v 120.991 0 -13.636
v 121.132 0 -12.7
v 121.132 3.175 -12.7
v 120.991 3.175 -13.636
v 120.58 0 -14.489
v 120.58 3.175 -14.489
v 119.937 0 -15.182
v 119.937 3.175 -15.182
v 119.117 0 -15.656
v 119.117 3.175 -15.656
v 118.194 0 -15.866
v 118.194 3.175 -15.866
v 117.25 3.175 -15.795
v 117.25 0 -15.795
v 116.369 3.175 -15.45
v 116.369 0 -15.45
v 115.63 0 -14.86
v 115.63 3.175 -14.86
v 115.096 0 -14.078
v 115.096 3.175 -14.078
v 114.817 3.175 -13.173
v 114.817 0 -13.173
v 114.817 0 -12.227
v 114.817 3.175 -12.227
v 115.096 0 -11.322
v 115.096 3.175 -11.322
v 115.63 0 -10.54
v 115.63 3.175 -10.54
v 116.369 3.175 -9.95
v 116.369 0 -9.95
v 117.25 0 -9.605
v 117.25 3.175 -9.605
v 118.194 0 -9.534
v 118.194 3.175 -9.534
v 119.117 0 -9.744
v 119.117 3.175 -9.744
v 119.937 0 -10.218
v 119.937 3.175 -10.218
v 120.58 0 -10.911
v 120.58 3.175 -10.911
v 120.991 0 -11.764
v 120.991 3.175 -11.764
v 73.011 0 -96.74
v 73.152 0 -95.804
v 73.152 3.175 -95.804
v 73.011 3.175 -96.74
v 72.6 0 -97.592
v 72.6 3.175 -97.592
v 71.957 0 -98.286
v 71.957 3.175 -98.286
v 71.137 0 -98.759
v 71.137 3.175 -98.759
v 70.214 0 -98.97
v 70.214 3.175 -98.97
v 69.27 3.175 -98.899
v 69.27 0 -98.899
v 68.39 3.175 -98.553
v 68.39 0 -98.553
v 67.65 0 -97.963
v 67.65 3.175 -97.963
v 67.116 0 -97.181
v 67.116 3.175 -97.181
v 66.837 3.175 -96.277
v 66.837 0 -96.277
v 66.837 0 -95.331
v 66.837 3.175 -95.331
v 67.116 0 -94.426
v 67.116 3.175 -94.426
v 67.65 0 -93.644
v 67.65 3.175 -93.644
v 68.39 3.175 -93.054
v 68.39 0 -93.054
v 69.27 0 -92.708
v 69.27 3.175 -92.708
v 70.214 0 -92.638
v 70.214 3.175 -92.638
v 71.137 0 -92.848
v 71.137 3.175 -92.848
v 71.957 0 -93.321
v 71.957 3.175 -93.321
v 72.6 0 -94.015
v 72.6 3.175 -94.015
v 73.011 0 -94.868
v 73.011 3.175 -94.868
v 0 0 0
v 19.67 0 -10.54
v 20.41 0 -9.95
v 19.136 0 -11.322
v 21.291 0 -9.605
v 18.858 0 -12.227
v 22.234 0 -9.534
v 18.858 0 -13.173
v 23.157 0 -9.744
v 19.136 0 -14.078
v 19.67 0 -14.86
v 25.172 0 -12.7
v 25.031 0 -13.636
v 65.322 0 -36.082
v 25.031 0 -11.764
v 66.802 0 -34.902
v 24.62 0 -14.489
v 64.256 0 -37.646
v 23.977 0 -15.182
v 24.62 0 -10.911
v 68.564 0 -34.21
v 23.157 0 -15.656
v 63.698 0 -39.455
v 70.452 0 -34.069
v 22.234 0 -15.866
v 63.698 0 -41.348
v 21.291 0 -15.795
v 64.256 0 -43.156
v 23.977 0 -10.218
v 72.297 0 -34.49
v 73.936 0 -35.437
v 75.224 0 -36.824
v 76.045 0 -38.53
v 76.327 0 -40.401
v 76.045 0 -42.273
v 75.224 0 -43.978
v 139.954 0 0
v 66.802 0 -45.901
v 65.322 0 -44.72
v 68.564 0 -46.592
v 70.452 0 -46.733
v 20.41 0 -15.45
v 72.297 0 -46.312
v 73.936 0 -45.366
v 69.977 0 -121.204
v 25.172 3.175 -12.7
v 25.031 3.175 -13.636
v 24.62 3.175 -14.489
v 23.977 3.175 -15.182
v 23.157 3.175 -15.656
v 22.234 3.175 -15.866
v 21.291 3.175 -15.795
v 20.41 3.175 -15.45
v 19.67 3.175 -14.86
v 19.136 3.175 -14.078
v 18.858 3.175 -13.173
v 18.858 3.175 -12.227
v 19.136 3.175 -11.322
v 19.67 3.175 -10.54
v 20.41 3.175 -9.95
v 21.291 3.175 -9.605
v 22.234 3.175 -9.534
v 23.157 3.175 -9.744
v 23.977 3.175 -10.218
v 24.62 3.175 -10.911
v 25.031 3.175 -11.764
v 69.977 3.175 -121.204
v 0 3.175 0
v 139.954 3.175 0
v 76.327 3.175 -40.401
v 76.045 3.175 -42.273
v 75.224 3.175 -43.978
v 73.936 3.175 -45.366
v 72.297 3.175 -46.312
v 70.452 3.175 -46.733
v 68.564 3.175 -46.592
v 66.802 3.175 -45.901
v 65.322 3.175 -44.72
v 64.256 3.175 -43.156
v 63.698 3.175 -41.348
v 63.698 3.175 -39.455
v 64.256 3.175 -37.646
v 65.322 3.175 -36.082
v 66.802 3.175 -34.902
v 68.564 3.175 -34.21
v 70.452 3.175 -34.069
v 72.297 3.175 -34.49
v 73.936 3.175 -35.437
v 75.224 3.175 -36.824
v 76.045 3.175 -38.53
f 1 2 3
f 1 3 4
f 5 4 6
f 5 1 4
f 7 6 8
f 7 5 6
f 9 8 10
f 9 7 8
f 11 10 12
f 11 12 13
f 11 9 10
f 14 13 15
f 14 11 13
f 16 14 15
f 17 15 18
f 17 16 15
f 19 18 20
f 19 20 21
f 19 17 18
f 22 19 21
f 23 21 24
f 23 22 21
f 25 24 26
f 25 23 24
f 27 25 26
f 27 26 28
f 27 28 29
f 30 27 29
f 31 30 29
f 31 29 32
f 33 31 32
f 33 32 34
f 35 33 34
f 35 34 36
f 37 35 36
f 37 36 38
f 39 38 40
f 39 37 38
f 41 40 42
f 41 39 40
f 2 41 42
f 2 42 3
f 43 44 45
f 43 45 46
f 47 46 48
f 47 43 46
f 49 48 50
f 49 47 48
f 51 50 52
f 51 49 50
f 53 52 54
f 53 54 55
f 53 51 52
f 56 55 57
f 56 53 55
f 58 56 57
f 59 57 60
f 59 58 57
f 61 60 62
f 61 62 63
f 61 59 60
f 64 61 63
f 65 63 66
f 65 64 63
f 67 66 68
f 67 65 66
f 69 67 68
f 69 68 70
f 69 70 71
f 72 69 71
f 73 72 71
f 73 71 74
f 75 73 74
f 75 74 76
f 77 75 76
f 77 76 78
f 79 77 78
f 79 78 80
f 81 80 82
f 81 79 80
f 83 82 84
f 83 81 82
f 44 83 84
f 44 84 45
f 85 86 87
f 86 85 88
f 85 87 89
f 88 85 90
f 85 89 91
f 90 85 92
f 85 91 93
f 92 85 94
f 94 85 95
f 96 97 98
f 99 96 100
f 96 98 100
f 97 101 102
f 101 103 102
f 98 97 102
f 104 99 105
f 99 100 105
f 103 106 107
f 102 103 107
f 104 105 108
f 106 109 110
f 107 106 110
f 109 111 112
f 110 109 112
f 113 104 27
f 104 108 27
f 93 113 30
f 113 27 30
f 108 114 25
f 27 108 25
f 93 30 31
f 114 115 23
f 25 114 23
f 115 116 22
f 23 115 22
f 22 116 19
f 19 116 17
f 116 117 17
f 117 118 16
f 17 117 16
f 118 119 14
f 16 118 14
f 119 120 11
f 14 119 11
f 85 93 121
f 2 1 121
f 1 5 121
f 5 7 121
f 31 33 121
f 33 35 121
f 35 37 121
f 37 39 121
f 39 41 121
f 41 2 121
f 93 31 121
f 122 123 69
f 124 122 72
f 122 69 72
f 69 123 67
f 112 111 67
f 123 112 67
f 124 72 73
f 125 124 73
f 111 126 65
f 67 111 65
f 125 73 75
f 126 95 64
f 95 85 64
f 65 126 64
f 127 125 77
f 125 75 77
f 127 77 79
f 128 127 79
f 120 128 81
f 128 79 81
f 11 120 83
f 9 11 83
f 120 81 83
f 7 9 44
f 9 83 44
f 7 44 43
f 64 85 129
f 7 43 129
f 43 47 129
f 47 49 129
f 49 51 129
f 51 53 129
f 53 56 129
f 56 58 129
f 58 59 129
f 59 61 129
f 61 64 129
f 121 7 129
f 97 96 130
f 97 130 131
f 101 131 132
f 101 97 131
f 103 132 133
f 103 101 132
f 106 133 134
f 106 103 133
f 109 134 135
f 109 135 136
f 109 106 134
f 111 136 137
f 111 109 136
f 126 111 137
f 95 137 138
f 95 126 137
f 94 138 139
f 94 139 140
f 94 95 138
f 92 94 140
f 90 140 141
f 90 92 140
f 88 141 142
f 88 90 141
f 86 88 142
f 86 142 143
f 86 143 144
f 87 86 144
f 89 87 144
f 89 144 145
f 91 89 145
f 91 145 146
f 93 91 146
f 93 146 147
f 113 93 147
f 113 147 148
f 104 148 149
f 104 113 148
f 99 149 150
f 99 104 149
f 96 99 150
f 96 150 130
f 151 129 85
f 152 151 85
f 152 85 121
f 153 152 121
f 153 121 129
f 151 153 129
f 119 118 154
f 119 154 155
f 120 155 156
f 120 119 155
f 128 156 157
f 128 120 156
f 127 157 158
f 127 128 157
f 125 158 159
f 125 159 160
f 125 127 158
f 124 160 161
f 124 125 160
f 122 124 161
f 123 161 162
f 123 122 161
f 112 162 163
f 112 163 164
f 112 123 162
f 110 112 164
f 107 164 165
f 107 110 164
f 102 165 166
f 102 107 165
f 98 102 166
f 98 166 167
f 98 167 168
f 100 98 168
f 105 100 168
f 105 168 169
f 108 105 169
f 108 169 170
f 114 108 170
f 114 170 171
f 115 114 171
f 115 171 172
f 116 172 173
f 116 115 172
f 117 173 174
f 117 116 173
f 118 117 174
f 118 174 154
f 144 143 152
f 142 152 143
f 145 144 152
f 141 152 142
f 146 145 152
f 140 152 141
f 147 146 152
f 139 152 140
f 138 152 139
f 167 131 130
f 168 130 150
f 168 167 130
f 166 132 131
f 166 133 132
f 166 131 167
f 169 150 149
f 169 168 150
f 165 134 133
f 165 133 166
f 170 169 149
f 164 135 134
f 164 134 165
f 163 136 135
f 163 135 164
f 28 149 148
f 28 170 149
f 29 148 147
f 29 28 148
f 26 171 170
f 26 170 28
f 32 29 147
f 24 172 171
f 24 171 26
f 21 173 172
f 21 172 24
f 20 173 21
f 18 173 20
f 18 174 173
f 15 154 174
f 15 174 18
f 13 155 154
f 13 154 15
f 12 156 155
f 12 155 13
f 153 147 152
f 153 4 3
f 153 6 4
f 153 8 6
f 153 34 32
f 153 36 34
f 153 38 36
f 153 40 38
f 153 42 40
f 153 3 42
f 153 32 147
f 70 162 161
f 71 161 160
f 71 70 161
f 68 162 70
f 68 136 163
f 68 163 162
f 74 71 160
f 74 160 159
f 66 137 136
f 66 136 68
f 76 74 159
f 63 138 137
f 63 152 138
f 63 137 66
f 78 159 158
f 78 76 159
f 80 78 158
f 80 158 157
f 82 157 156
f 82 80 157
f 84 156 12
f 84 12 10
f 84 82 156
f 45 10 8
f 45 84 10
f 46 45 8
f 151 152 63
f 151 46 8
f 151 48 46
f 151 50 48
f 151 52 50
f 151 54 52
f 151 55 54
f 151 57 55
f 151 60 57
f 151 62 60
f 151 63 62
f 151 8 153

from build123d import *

# Parameters (mm, degrees)
SKETCH1_R           = 6.35
SKETCH1_R_2         = 3.175
BOSS_EXTRUDE1_DEPTH = 3.175


with BuildPart() as part:
    # Sketch1 → Boss-Extrude1 (new body)
    with BuildSketch(Plane(origin=(0, 0, 0), x_dir=(1, 0, 0), z_dir=(0, 1, 0))):
        Polygon((0, 0), (139.954, 0), (69.977, 121.203719361), align=None)
        with Locations((69.977, 40.401239787)):
            Circle(SKETCH1_R, mode=Mode.SUBTRACT)
        with Locations((117.956954744, 12.7)):
            Circle(SKETCH1_R_2, mode=Mode.SUBTRACT)
        with Locations((21.997045256, 12.7)):
            Circle(SKETCH1_R_2, mode=Mode.SUBTRACT)
        with Locations((69.977, 95.803719361)):
            Circle(SKETCH1_R_2, mode=Mode.SUBTRACT)
    extrude(amount=BOSS_EXTRUDE1_DEPTH)


solid = part.part
